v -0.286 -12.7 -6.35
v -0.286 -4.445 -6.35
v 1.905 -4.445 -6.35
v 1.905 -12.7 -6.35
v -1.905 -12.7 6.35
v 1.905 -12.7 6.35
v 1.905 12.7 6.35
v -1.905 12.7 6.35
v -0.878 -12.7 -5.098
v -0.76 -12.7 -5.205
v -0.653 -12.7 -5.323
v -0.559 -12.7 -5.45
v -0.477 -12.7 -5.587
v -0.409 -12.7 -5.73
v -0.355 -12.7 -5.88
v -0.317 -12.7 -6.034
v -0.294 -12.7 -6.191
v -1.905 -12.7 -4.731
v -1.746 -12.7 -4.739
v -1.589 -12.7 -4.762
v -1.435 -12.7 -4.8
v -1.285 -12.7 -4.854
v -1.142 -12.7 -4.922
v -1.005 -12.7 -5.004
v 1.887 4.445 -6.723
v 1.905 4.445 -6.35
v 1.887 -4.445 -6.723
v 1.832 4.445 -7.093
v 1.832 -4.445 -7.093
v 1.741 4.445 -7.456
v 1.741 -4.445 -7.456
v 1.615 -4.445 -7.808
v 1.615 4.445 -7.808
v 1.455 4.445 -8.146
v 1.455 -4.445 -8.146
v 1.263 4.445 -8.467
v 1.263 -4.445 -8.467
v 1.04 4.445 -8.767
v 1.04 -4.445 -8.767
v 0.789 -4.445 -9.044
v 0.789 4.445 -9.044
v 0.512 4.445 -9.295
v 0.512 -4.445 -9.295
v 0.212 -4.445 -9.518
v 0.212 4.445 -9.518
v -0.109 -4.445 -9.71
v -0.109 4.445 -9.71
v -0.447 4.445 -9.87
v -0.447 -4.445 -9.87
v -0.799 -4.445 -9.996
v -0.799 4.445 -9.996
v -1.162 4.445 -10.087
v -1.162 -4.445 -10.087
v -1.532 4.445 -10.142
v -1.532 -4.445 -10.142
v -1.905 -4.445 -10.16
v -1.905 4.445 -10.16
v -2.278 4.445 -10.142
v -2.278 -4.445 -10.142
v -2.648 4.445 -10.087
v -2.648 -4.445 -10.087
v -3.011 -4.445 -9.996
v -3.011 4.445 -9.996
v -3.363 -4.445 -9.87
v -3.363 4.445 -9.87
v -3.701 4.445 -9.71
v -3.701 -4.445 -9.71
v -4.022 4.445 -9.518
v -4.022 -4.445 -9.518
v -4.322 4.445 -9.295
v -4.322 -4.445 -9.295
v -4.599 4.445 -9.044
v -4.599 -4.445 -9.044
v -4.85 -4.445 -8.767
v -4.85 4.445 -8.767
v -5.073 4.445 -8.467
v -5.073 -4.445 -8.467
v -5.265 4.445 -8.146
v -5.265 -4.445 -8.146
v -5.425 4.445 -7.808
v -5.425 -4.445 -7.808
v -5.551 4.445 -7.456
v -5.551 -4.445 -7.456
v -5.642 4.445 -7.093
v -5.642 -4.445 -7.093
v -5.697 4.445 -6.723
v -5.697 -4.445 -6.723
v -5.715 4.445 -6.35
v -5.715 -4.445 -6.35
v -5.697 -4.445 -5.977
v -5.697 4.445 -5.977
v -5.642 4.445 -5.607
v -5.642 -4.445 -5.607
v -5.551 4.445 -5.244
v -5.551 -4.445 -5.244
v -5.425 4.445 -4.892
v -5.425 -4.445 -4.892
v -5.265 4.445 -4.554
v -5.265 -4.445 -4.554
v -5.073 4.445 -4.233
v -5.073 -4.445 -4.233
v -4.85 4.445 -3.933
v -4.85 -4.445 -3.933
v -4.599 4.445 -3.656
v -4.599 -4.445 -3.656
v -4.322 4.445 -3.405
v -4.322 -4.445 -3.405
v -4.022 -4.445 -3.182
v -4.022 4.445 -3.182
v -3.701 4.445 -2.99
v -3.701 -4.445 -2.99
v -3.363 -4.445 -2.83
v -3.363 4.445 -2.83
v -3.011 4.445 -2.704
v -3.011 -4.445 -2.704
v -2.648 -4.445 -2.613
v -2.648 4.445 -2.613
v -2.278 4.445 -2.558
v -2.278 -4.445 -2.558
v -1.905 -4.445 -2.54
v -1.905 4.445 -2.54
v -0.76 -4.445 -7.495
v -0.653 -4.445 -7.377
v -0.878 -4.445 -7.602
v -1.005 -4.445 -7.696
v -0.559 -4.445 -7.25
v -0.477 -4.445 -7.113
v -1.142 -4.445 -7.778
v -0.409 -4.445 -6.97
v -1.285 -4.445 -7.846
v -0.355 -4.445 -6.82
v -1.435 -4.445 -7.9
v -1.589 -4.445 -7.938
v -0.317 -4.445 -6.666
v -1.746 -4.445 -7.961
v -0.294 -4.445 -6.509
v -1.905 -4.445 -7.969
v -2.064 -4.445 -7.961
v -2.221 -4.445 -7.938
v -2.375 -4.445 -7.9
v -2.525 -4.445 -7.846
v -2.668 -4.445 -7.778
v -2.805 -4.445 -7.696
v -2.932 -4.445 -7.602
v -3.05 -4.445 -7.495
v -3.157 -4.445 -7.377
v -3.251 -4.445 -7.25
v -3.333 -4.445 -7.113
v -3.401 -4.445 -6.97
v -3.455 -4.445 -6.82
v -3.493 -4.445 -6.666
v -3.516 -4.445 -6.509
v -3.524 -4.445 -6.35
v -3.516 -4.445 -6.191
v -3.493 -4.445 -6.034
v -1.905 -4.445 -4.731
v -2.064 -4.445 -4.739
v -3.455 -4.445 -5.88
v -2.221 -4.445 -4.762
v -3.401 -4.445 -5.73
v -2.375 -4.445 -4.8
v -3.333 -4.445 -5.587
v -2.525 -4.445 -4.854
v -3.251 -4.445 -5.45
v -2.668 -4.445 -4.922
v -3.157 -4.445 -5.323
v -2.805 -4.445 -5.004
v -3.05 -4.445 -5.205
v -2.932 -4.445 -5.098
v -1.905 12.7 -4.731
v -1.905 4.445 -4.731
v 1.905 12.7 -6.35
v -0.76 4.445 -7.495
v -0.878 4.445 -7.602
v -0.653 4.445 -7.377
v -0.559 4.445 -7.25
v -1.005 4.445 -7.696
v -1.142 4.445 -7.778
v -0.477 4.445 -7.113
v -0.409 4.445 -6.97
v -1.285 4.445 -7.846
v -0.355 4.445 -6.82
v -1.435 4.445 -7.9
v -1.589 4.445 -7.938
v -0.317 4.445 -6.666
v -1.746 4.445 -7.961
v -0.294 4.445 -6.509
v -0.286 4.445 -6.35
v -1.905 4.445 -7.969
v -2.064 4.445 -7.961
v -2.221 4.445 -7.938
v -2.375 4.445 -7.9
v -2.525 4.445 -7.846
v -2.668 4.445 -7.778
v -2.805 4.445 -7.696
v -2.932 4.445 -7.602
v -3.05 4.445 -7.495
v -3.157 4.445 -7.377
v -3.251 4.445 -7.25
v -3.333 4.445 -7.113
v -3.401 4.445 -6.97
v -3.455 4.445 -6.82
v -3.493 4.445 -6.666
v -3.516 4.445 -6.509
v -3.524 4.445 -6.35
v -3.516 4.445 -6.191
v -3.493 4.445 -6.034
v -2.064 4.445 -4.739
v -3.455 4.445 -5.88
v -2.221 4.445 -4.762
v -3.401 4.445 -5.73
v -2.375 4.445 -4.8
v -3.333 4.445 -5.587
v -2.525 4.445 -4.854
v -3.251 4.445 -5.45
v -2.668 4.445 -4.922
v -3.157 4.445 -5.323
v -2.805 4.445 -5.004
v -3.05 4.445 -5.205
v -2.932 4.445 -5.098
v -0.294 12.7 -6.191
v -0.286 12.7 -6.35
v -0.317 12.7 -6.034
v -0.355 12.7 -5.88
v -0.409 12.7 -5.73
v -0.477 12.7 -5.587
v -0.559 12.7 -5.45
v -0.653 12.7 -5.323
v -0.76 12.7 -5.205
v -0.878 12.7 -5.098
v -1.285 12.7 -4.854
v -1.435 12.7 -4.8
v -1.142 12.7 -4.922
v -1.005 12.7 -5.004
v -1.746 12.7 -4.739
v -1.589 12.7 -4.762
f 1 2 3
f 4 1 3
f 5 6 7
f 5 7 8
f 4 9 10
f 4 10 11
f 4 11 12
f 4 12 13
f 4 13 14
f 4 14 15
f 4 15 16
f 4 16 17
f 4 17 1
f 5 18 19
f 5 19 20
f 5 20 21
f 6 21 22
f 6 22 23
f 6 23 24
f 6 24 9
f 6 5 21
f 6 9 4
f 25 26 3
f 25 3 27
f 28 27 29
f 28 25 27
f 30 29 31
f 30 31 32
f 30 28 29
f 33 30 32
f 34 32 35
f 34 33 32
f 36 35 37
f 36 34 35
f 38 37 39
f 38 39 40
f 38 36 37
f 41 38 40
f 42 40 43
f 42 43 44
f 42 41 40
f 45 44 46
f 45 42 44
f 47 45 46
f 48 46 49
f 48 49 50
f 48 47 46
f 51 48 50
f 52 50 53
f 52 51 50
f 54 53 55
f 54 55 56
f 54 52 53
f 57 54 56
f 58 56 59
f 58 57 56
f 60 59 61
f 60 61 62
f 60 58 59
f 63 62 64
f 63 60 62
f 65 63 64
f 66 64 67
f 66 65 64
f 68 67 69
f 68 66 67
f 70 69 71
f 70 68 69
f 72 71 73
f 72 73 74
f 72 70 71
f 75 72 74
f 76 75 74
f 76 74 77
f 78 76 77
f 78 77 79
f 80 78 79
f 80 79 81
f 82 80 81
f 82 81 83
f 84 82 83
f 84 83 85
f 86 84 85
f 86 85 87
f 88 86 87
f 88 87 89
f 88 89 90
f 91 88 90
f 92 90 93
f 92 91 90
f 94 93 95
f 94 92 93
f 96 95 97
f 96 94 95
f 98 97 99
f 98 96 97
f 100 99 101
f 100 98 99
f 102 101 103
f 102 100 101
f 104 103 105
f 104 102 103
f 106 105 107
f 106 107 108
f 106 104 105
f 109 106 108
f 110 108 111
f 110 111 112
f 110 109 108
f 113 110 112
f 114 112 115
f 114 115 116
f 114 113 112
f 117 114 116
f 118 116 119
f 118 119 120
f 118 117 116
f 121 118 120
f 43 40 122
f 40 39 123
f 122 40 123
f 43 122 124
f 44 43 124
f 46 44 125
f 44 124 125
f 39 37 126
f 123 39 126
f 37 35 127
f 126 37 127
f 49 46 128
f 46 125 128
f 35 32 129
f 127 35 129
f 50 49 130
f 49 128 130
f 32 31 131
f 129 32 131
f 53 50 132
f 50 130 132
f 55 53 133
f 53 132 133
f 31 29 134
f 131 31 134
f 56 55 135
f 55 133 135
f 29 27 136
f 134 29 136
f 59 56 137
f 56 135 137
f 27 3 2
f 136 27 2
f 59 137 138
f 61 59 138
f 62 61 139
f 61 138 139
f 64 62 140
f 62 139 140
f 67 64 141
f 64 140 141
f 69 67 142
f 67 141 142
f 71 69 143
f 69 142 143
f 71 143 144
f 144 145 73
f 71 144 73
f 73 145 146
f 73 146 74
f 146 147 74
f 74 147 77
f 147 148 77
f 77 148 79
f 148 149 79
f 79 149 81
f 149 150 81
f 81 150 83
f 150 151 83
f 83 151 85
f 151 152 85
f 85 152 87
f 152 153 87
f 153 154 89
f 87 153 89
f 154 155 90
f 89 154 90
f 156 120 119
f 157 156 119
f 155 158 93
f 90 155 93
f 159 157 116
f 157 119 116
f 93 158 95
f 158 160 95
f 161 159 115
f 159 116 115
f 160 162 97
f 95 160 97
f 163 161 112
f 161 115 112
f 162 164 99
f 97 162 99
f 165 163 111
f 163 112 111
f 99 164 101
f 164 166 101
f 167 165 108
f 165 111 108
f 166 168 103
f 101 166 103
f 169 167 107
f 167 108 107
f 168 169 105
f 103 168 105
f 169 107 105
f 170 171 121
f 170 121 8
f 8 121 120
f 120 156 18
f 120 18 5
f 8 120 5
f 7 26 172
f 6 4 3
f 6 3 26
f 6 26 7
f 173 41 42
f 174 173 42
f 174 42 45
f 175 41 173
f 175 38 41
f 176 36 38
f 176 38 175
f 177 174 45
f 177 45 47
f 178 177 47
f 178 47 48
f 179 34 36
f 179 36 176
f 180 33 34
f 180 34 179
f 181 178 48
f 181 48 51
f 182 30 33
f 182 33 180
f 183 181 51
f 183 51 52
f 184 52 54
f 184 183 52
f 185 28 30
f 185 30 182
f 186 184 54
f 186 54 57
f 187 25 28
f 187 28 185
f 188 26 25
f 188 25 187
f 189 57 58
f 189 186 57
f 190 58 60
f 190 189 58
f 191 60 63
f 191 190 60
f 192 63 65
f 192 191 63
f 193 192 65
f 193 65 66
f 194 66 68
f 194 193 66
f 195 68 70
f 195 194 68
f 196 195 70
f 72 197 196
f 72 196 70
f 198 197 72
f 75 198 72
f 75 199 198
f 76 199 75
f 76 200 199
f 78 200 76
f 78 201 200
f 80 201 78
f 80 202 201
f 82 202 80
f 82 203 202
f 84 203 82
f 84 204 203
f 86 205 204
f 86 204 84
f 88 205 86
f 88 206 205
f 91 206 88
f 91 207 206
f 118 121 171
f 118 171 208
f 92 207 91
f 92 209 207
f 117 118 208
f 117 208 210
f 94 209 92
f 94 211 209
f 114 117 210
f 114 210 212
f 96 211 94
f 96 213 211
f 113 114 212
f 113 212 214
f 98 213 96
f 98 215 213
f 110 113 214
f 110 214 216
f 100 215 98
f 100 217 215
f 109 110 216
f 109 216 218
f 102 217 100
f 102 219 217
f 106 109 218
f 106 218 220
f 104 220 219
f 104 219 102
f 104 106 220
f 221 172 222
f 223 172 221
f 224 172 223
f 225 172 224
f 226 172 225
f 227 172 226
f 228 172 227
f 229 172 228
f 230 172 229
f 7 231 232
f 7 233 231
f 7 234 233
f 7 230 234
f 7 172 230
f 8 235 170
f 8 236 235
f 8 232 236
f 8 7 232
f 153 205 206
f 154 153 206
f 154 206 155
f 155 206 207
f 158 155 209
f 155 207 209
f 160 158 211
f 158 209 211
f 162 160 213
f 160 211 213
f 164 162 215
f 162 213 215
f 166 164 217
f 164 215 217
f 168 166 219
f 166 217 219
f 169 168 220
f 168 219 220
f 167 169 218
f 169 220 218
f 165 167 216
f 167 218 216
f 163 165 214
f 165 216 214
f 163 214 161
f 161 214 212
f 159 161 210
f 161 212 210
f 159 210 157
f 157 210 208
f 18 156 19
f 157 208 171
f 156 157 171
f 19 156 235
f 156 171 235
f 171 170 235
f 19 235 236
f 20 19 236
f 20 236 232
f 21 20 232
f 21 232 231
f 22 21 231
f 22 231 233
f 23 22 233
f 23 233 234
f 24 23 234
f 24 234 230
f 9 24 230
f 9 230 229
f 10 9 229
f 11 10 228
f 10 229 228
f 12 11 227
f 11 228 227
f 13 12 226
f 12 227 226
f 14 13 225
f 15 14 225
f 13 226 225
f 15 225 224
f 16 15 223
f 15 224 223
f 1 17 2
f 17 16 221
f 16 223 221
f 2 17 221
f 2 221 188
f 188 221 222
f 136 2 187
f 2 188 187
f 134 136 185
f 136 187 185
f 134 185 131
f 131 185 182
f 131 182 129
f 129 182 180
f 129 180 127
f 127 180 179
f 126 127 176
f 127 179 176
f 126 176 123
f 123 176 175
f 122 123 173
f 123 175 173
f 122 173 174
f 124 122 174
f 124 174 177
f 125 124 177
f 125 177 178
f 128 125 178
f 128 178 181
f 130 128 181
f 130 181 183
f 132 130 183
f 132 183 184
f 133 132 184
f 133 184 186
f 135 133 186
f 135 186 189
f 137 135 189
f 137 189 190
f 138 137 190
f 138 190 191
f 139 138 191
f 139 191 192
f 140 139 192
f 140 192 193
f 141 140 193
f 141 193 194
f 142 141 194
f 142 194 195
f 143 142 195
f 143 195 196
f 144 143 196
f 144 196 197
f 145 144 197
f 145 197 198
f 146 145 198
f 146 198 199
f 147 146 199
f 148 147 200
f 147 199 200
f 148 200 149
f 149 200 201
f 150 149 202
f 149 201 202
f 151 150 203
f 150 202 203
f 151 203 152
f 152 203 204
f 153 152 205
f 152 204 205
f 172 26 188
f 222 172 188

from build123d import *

# Parameters (mm, degrees)
F0_W     = 3.81
F0_H     = 12.7
F1_DEPTH = 12.7
F3_DEPTH = 4.445
F4_W     = 3.81
F4_H     = 12.7
F5_DEPTH = 12.7
F6_R     = 1.61925
F7_DEPTH = 25.4


with BuildPart() as f1:
    # F0 (on Front) → F1 (new body)
    with BuildSketch(Plane.XZ):
        Rectangle(F0_W, F0_H)
    extrude(amount=F1_DEPTH)

    # F2 (on face) → F3 (join, symmetric)
    with BuildSketch(Plane(origin=(0, 0, 0), x_dir=(-1, 0, 0), z_dir=(0, 1, 0))):
        Polygon((-1.905, 6.35), (-1.905, -6.35), (1.905, -6.35), (1.905, -2.54), (1.905, 6.35), align=None)
        with BuildLine():
            Line((1.905, -6.35), (-1.905, -6.35))
            ThreePointArc((-1.905, -6.35), (4.5990768363, -9.0440768363), (1.905, -2.54))
            Line((1.905, -2.54), (1.905, -6.35))
        make_face()
    extrude(amount=F3_DEPTH, both=True)

    # F4 (on face) → F5 (join)
    with BuildSketch(Plane(origin=(0, 0, 0), x_dir=(-1, 0, 0), z_dir=(0, 1, 0))):
        Rectangle(F4_W, F4_H)
    extrude(amount=F5_DEPTH)

    # F6 (on face) → F7 (cut)
    with BuildSketch(Plane(origin=(0, 12.7, 0), x_dir=(-1, 0, 0), z_dir=(0, 1, 0))):
        with Locations((1.905, -6.35)):
            Circle(F6_R)
    extrude(amount=-F7_DEPTH, mode=Mode.SUBTRACT)


solid = f1.part
